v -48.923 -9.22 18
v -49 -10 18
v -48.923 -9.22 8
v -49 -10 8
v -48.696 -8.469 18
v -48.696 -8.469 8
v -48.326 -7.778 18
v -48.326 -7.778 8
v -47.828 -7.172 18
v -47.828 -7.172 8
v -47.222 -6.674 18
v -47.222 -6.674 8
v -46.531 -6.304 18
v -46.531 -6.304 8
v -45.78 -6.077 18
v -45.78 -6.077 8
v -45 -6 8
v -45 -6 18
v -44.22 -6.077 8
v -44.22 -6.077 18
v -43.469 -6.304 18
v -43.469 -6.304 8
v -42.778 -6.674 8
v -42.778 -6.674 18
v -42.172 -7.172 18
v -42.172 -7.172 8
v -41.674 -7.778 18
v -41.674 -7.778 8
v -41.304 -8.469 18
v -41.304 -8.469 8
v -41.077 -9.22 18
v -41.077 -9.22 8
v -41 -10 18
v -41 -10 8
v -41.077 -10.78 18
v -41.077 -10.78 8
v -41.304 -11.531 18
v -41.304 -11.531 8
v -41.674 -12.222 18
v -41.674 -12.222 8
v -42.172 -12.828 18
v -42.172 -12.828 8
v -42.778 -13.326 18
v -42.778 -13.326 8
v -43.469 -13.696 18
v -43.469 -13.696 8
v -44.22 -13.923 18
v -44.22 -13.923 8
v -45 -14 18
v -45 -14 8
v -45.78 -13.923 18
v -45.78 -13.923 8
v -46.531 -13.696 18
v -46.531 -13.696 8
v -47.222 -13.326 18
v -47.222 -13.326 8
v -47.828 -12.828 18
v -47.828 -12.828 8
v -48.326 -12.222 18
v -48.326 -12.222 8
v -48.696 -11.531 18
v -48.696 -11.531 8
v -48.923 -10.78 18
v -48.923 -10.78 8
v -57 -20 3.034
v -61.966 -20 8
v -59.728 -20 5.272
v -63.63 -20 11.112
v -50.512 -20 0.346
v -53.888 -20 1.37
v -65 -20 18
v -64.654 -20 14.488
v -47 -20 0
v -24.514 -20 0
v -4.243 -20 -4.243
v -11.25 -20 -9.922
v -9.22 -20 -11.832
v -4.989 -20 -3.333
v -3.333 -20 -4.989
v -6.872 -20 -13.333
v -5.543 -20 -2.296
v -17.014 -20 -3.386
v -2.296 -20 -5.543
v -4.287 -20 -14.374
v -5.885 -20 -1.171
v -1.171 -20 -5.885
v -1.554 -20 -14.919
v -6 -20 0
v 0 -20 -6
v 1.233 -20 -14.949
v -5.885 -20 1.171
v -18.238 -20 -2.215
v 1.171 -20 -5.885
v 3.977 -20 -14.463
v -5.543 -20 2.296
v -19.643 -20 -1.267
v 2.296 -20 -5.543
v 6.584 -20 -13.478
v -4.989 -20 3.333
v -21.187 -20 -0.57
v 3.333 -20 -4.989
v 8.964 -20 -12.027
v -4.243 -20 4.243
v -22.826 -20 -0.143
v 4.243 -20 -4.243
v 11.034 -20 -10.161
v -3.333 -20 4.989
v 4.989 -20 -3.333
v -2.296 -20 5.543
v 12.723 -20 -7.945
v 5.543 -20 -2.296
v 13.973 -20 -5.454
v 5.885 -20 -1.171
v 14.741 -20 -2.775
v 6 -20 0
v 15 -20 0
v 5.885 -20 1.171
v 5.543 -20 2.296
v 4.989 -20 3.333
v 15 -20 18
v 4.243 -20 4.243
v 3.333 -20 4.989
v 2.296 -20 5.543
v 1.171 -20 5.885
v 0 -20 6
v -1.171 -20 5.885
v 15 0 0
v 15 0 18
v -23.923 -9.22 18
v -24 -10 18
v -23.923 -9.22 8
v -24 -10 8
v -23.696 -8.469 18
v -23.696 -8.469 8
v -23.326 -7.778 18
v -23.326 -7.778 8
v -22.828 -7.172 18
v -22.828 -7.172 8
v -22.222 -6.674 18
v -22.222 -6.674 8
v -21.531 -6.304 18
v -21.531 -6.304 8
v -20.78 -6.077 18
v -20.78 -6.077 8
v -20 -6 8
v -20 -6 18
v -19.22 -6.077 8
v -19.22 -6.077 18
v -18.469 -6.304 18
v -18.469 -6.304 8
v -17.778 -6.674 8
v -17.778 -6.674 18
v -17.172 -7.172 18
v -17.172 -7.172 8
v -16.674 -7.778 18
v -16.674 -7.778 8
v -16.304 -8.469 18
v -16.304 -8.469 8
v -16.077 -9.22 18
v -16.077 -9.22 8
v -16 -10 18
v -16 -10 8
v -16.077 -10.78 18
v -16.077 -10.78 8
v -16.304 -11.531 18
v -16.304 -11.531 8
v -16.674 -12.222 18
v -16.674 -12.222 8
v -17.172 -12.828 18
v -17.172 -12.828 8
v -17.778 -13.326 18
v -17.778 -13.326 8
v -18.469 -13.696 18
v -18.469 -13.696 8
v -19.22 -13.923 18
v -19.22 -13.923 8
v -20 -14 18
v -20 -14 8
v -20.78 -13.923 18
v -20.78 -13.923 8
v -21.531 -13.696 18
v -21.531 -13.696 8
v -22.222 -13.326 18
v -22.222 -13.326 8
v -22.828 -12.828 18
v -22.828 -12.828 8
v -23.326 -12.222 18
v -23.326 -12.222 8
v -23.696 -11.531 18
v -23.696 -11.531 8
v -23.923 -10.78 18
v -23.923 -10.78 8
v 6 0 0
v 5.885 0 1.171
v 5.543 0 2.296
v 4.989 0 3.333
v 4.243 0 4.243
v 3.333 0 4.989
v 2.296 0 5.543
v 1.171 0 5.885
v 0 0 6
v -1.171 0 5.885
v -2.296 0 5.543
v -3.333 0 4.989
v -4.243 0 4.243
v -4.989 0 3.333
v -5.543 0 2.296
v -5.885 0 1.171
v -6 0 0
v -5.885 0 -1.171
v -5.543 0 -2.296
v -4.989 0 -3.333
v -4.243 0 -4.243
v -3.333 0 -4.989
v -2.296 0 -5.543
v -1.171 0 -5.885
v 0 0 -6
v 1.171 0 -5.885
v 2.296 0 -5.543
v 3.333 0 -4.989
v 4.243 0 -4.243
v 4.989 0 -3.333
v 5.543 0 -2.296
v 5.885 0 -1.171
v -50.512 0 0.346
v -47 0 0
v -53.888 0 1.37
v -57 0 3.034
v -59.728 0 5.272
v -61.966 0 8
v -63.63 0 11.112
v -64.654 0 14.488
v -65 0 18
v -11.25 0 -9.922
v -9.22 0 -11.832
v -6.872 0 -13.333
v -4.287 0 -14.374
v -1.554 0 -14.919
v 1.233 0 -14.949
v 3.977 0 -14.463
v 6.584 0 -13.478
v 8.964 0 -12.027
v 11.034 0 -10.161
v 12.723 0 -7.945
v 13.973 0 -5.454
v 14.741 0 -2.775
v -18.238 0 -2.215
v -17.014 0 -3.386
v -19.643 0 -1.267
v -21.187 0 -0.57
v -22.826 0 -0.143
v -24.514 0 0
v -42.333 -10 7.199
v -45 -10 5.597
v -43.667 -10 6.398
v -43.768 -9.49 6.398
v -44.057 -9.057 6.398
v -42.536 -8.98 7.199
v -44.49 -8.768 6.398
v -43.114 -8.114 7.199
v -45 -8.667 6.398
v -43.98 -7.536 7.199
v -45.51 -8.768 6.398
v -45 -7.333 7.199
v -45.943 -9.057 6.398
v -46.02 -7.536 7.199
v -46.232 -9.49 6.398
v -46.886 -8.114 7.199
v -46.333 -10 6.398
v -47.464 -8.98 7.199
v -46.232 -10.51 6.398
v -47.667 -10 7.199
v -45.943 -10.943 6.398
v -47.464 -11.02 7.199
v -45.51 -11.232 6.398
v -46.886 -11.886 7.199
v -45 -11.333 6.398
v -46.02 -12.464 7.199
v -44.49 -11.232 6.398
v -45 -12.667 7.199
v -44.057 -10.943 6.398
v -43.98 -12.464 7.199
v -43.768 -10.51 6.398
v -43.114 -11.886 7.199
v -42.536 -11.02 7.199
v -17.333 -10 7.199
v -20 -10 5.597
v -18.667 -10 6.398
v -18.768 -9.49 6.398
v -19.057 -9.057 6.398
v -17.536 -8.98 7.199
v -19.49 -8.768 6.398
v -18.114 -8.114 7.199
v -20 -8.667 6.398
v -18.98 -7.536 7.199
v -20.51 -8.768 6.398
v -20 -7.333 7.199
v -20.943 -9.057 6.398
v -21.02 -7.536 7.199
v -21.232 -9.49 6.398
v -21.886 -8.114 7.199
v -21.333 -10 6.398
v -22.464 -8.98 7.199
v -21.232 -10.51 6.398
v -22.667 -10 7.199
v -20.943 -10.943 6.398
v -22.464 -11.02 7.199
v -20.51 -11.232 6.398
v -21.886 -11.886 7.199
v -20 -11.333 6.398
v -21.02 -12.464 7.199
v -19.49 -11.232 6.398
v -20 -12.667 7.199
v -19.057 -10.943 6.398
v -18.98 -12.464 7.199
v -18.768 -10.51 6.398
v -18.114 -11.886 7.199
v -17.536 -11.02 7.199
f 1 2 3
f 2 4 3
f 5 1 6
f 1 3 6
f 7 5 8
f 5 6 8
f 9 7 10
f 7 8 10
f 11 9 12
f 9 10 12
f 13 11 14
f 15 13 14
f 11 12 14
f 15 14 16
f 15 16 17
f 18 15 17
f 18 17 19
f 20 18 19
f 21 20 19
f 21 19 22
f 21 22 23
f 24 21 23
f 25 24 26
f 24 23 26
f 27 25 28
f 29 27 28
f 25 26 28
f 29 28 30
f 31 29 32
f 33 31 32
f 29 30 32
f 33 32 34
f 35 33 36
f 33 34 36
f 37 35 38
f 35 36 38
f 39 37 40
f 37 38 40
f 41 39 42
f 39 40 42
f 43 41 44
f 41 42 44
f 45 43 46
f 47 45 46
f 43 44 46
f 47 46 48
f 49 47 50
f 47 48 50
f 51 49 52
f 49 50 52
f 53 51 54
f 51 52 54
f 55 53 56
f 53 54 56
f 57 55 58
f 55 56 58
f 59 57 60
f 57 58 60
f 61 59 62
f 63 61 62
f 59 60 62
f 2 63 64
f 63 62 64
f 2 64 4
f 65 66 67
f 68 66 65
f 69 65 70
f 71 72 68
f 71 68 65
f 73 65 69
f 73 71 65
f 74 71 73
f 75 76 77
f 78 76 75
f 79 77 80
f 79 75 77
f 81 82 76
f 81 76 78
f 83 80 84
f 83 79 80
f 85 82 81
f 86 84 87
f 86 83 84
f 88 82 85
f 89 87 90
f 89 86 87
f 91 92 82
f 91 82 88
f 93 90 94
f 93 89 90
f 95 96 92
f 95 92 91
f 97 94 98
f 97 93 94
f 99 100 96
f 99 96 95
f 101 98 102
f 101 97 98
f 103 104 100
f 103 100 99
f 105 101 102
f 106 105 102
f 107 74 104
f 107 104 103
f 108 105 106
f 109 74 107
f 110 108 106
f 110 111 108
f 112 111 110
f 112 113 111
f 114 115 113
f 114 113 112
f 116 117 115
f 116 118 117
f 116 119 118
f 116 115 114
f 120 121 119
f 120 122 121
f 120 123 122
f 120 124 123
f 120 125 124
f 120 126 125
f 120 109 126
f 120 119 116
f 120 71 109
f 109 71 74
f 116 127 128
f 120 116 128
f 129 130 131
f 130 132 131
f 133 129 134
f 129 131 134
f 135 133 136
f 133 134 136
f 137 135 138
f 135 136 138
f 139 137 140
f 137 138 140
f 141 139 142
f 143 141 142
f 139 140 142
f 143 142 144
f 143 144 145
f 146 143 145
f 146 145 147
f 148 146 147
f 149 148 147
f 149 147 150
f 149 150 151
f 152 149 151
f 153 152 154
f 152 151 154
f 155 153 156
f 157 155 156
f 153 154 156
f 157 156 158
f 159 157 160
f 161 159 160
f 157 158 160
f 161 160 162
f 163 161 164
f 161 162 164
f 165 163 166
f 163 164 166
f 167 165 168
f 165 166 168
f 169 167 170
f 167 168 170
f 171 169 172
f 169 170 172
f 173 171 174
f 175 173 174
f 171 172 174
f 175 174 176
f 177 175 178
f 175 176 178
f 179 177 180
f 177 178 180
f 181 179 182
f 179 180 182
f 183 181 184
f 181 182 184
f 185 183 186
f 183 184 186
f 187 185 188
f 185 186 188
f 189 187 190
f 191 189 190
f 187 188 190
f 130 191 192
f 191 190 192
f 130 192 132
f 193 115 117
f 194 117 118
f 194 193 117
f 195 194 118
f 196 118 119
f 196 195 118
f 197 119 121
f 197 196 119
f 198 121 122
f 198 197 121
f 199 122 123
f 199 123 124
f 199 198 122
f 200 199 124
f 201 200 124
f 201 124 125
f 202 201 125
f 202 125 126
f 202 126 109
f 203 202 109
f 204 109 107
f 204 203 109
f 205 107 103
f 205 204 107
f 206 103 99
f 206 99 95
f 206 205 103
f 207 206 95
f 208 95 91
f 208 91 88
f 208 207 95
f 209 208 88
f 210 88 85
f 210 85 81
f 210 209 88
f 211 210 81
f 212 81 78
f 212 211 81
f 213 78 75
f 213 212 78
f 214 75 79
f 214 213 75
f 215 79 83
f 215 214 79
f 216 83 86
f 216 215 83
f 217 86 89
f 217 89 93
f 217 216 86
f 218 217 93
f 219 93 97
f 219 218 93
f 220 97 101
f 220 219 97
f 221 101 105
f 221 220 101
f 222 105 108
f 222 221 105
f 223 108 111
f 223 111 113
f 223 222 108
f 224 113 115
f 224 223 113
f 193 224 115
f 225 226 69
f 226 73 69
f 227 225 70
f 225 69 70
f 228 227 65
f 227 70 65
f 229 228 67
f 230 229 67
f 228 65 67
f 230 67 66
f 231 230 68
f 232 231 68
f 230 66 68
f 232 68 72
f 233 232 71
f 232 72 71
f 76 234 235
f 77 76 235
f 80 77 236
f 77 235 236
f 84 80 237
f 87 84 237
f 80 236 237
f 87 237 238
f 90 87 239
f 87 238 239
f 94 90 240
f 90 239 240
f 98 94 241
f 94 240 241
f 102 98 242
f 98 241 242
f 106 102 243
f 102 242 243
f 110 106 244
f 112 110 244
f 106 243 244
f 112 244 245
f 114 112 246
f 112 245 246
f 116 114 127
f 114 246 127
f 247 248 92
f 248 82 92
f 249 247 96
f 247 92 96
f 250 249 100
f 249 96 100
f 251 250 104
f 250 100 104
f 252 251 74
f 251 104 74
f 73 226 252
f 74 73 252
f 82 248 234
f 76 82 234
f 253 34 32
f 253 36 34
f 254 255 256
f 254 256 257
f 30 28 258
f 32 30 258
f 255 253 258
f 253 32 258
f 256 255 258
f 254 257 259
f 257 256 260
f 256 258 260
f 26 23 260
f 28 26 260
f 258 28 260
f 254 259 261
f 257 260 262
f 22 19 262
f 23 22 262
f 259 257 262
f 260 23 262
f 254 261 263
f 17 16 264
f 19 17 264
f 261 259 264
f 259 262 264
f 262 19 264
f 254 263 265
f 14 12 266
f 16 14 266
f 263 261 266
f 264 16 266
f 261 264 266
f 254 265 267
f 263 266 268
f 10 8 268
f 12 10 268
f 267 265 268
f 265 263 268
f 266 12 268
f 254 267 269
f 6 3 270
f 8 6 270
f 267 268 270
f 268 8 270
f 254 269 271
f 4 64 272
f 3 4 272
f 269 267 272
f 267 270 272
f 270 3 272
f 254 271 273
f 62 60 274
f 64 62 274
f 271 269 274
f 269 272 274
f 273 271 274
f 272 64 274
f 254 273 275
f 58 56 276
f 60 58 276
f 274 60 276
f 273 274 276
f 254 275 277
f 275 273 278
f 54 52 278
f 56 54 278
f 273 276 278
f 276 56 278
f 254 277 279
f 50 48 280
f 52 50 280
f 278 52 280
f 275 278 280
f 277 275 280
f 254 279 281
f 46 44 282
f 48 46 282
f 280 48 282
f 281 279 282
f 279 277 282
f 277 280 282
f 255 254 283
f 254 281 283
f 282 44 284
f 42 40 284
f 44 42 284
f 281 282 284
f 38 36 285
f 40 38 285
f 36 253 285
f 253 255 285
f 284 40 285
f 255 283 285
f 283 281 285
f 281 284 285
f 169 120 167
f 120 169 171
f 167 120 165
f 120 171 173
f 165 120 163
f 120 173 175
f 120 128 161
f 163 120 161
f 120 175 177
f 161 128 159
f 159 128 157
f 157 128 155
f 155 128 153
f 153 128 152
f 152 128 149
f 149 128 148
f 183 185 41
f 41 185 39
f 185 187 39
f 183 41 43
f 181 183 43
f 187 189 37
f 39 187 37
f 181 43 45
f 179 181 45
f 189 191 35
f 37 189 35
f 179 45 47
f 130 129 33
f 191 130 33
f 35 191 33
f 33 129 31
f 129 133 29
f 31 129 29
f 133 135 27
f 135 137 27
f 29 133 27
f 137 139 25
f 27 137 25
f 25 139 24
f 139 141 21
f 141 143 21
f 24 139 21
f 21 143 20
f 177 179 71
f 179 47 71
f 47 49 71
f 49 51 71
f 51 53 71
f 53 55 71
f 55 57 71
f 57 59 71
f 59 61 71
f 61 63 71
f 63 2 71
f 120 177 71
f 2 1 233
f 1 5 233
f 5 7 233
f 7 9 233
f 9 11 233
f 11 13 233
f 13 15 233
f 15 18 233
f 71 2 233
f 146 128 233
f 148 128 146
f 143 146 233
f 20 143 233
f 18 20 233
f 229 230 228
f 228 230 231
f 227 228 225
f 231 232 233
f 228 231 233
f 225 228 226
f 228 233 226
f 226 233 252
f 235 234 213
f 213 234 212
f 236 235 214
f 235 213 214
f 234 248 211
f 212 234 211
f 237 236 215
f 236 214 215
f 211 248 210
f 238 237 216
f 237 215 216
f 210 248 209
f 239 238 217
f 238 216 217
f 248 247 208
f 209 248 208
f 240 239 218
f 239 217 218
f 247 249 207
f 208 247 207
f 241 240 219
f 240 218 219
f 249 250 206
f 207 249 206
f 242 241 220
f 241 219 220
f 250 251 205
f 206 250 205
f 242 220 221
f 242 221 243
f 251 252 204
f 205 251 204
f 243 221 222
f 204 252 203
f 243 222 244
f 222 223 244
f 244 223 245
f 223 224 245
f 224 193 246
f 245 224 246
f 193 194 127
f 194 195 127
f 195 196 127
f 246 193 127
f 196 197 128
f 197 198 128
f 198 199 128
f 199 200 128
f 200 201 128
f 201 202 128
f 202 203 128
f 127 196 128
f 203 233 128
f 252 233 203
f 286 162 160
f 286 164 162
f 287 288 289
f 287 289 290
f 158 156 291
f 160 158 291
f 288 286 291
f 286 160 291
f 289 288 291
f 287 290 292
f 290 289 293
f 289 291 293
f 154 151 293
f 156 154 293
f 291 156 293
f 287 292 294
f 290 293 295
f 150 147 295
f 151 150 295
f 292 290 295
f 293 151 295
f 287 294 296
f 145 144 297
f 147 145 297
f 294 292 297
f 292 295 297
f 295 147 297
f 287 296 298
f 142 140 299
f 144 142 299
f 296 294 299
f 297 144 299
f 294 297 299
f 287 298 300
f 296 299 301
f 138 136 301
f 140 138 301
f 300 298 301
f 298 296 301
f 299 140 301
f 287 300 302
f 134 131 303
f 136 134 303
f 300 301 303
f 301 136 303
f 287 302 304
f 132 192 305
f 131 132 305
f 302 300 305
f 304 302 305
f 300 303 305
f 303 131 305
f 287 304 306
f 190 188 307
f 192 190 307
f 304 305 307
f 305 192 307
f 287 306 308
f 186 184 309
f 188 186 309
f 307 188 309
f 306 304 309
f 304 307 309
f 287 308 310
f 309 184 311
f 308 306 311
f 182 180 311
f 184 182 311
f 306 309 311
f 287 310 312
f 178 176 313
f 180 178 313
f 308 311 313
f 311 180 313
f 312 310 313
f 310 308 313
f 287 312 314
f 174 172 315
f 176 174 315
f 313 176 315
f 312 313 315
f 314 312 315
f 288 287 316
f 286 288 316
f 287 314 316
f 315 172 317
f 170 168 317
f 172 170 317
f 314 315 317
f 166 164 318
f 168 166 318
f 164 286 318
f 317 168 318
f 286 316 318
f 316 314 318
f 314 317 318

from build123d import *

# Parameters (mm, degrees)
F0_R     = 6
F1_DEPTH = 20
F2_R     = 10
F4_D     = 8
F4_DEPTH = 10
F4_TIP   = 2.4034424761
F5_R     = 17.99999


# Not quite as in the source:
# - a fillet or chamfer is up to 0.001 mm smaller than in the source, because OpenCascade refuses the exact size


with BuildPart() as f1:
    # F0 (on Front) → F1 (new body)
    with BuildSketch(Plane.XZ):
        with BuildLine():
            Line((-20, 0), (-11.25, -9.9215674165))
            ThreePointArc((-11.25, -9.9215674165), (5.3033008589, -14.0312152004), (15, 0))
            Line((15, 0), (15, 15))
            Line((15, 15), (15, 18))
            Line((15, 18), (-65, 18))
            Line((-65, 18), (-65, 0))
            Line((-65, 0), (-20, 0))
        make_face()
        Circle(F0_R, mode=Mode.SUBTRACT)
    extrude(amount=F1_DEPTH)

    # F2
    f2_edges = [f1.edges().sort_by_distance(p)[0] for p in [
        (-20, -10, 0),
    ]]
    fillet(f2_edges, radius=F2_R)

    # F4
    with Locations(Plane.XY.offset(18)):
        with Locations((-45, -10), (-20, -10)):
            Hole(F4_D / 2, depth=F4_DEPTH)
            with Locations((0, 0, -(F4_DEPTH + F4_TIP / 2))):  # 118° drill point
                Cone(0, F4_D / 2, F4_TIP, mode=Mode.SUBTRACT)

    # F5 (radius 18 in the source; OpenCascade refuses exactly that, so slightly less here)
    f5_edges = [f1.edges().sort_by_distance(p)[0] for p in [
        (-65, -10, 0),
    ]]
    fillet(f5_edges, radius=F5_R)


solid = f1.part
